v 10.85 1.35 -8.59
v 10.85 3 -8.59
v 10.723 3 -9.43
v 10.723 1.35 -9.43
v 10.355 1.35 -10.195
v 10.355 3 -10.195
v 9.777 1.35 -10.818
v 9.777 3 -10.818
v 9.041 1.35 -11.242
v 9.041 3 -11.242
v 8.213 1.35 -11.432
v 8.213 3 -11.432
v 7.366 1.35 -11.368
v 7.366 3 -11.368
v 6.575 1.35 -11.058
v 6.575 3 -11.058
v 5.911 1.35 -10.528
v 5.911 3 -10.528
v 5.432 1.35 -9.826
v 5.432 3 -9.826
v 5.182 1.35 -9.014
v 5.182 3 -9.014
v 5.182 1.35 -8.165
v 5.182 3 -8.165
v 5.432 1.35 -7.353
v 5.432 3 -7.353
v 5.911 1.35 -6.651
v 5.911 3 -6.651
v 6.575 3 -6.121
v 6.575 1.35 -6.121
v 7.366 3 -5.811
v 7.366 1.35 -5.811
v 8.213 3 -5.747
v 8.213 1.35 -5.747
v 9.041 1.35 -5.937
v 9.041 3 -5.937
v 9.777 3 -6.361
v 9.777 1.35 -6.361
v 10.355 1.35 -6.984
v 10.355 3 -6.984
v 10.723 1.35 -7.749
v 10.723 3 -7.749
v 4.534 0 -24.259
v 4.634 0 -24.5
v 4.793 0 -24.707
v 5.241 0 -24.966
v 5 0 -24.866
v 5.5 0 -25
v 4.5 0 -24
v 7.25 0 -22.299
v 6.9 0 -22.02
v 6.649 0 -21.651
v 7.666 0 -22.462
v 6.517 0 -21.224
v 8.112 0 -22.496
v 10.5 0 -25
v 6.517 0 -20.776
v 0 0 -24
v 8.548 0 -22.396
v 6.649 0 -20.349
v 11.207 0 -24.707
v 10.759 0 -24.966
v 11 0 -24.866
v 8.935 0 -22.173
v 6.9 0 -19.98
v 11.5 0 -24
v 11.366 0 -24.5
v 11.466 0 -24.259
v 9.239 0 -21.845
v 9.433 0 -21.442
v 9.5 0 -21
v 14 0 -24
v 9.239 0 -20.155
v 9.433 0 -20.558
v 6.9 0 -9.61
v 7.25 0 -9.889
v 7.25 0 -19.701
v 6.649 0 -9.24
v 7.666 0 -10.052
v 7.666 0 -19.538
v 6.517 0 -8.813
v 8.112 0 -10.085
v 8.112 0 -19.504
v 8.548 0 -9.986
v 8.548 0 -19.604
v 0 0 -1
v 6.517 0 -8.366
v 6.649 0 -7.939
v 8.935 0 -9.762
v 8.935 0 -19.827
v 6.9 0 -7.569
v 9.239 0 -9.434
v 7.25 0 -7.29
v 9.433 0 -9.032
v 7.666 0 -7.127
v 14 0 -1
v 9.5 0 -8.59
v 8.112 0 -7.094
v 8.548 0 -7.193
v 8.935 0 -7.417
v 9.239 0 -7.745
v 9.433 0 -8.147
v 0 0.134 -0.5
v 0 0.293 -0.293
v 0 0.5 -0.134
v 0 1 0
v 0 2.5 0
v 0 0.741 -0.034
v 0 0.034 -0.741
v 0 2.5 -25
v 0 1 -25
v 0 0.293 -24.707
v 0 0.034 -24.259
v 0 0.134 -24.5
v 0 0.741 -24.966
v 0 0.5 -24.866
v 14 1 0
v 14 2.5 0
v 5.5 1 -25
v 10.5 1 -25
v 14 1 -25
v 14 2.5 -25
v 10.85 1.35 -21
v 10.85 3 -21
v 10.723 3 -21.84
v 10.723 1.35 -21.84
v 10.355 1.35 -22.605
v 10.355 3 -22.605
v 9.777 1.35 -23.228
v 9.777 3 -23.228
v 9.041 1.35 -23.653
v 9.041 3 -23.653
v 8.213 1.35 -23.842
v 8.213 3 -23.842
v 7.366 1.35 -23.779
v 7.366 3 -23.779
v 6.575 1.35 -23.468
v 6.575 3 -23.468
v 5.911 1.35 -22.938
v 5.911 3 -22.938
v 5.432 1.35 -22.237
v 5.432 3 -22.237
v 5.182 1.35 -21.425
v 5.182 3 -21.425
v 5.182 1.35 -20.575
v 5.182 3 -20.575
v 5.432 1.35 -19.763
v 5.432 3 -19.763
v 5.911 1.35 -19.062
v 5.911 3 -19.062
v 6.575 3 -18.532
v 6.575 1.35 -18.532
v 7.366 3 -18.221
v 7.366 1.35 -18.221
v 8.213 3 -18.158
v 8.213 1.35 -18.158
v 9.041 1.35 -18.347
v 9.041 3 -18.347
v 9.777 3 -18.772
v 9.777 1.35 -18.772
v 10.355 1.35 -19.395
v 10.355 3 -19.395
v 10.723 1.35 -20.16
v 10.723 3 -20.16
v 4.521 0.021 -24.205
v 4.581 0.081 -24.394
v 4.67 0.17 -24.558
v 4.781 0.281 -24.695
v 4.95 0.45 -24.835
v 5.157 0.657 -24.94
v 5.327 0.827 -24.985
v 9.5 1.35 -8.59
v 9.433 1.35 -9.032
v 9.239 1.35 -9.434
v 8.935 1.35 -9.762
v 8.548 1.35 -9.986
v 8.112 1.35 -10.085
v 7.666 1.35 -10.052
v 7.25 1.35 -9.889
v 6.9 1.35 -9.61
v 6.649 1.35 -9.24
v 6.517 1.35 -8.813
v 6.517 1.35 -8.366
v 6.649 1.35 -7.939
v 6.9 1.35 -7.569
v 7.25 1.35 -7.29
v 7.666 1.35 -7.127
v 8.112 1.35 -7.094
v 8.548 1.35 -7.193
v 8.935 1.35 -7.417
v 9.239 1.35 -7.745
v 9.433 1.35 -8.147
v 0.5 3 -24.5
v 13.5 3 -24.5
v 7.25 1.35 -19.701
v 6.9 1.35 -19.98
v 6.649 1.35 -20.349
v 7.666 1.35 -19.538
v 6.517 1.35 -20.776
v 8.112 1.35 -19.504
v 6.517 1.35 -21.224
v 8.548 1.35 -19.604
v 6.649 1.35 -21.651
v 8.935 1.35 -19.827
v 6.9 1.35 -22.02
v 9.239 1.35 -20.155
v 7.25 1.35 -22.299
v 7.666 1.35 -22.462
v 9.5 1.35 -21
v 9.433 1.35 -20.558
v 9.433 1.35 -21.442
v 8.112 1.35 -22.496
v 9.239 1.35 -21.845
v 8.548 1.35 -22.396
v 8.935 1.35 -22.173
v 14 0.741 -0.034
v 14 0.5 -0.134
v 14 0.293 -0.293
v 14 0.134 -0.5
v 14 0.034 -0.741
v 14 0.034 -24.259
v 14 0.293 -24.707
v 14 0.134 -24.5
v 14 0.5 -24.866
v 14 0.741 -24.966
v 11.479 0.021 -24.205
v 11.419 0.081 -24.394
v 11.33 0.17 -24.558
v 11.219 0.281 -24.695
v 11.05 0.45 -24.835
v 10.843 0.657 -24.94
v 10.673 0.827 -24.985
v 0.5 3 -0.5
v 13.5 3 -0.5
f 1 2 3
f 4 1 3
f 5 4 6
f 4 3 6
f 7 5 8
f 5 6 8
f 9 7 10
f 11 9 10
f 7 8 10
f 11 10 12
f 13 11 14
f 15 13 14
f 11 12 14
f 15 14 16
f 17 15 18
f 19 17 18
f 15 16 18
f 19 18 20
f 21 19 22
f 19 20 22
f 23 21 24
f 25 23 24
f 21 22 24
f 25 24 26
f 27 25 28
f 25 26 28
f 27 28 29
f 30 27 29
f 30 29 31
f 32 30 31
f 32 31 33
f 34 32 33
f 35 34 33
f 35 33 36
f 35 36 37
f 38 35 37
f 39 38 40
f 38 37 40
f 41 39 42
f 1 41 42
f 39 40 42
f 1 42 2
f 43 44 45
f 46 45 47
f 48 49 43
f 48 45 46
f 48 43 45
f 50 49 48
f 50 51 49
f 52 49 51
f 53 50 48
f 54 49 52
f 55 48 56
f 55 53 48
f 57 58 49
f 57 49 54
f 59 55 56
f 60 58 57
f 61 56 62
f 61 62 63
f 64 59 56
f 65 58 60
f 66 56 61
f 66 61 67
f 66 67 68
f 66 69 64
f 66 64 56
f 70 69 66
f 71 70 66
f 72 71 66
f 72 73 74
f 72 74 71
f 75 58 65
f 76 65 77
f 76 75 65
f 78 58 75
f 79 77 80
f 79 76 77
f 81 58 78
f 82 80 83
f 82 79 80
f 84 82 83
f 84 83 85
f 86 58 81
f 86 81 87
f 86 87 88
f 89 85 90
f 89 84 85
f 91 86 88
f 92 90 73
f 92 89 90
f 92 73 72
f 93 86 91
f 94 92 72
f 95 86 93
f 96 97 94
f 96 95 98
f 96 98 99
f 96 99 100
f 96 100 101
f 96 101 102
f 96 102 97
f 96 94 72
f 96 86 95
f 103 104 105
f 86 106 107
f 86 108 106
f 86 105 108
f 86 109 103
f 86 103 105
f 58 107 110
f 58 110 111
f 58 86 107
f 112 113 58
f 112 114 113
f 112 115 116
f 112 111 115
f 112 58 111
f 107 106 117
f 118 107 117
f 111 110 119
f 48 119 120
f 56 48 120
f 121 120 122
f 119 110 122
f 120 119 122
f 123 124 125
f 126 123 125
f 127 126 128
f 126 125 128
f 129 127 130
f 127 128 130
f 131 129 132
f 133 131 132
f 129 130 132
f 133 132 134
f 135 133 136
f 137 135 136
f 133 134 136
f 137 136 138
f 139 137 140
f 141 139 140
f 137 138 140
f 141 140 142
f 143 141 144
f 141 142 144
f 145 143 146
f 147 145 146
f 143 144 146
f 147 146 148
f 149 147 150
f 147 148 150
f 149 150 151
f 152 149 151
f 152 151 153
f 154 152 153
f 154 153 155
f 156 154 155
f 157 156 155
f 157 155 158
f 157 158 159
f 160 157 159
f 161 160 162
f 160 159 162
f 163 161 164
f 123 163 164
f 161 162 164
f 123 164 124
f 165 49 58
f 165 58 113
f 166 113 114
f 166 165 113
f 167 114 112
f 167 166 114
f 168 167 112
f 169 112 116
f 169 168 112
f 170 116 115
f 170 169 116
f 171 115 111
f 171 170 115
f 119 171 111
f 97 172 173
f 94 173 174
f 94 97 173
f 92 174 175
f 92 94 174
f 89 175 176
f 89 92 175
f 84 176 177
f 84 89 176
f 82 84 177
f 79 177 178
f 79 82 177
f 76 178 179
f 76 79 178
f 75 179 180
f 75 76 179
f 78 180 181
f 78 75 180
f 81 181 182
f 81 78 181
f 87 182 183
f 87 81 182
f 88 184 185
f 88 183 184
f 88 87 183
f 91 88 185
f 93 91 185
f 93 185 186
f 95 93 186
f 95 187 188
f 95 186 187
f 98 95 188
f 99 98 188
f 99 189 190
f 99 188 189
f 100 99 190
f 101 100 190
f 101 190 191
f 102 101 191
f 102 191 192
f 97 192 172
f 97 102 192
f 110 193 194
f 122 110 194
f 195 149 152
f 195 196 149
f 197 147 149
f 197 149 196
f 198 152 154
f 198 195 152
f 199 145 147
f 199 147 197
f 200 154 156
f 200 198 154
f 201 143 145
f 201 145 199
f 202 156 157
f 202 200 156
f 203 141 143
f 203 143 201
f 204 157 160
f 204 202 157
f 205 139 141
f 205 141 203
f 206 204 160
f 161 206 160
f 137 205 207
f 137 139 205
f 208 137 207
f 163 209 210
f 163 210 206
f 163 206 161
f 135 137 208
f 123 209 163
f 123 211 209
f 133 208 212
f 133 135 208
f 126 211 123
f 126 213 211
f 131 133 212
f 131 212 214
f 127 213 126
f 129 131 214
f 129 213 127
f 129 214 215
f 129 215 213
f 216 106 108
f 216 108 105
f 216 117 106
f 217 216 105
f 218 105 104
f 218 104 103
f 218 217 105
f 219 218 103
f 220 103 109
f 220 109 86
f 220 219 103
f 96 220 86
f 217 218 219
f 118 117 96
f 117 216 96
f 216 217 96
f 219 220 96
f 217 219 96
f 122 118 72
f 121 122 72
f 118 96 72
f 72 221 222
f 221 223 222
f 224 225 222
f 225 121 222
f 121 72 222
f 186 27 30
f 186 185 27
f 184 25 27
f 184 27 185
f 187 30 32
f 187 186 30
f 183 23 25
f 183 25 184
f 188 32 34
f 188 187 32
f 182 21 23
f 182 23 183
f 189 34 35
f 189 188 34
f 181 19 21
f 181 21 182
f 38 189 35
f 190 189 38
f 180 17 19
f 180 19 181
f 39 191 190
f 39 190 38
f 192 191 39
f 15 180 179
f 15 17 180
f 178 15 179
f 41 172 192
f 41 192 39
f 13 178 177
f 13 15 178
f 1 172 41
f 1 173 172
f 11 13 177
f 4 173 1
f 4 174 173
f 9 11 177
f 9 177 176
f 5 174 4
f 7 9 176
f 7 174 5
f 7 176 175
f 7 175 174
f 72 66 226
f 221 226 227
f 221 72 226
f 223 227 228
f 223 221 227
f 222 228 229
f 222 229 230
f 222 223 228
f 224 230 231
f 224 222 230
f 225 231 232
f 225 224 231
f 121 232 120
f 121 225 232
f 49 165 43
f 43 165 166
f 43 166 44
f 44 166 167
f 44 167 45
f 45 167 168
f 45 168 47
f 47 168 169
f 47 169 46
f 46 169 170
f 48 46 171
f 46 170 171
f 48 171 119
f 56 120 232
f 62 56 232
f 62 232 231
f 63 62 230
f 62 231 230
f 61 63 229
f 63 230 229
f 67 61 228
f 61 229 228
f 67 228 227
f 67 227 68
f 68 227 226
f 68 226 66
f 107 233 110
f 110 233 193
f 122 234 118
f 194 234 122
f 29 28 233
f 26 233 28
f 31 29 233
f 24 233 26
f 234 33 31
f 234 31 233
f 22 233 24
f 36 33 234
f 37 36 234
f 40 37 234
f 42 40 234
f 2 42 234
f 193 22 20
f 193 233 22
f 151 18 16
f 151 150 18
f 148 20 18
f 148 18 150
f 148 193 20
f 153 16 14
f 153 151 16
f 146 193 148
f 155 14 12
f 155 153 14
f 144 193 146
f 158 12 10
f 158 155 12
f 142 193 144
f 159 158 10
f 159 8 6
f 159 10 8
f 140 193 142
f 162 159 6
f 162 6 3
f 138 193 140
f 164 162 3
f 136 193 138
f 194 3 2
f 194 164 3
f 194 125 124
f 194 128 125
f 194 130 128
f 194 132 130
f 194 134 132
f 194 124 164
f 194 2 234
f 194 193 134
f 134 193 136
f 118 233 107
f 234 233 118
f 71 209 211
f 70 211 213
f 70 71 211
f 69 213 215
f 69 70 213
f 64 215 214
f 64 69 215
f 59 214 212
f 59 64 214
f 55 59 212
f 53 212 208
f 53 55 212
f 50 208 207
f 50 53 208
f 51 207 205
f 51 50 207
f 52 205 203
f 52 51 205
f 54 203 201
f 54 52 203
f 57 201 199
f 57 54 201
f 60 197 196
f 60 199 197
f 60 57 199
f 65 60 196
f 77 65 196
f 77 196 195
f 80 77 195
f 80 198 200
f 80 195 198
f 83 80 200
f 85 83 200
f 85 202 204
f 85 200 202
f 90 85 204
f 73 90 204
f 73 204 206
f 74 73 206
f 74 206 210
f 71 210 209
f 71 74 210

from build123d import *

# Parameters (mm, degrees)
SKETCH1_W           = 14
SKETCH1_H           = 25
SKETCH1_R           = 1.5
BOSS_EXTRUDE1_DEPTH = 3
CHAMFER1_SIZE       = 0.5
FILLET1_R           = 1
SKETCH2_R           = 2.85
CUT_EXTRUDE1_DEPTH  = 1.65
BOSS_EXTRUDE2_START = -1
BOSS_EXTRUDE2_DEPTH = 1


with BuildPart() as part:
    # Sketch1 → Boss-Extrude1 (new body)
    with BuildSketch(Plane(origin=(0, 0, 0), x_dir=(1, 0, 0), z_dir=(0, 1, 0))):
        with Locations((7, 12.5)):
            Rectangle(SKETCH1_W, SKETCH1_H)
        with Locations((8, 21)):
            Circle(SKETCH1_R, mode=Mode.SUBTRACT)
        with Locations((8, 8.5895)):
            Circle(SKETCH1_R, mode=Mode.SUBTRACT)
    extrude(amount=BOSS_EXTRUDE1_DEPTH)

    # Chamfer1
    chamfer1_edges = [part.edges().sort_by_distance(p)[0] for p in [
        (14, 3, -12.5),
        (7, 3, -25),
        (0, 3, -12.5),
        (7, 3, 0),
    ]]
    chamfer(chamfer1_edges, length=CHAMFER1_SIZE)

    # Fillet1
    fillet1_edges = [part.edges().sort_by_distance(p)[0] for p in [
        (7, 0, -25),
        (7, 0, 0),
    ]]
    fillet(fillet1_edges, radius=FILLET1_R)

    # Sketch2 → Cut-Extrude1 (cut)
    with BuildSketch(Plane(origin=(0, 3, 0), x_dir=(1, 0, 0), z_dir=(0, 1, 0))):
        with Locations((8, 21)):
            Circle(SKETCH2_R)
        with Locations((8, 8.5895)):
            Circle(SKETCH2_R)
    extrude(amount=-CUT_EXTRUDE1_DEPTH, mode=Mode.SUBTRACT)

    # Sketch3 → Boss-Extrude2 (add)
    with BuildSketch(Plane.XZ.offset(BOSS_EXTRUDE2_START)):
        with BuildLine():
            ThreePointArc((4.5, -24), (4.792893219, -24.707106781), (5.5, -25))
            Line((5.5, -25), (10.5, -25))
            ThreePointArc((10.5, -25), (11.207106781, -24.707106781), (11.5, -24))
            Line((11.5, -24), (4.5, -24))
        make_face()
    extrude(amount=BOSS_EXTRUDE2_DEPTH)


solid = part.part
